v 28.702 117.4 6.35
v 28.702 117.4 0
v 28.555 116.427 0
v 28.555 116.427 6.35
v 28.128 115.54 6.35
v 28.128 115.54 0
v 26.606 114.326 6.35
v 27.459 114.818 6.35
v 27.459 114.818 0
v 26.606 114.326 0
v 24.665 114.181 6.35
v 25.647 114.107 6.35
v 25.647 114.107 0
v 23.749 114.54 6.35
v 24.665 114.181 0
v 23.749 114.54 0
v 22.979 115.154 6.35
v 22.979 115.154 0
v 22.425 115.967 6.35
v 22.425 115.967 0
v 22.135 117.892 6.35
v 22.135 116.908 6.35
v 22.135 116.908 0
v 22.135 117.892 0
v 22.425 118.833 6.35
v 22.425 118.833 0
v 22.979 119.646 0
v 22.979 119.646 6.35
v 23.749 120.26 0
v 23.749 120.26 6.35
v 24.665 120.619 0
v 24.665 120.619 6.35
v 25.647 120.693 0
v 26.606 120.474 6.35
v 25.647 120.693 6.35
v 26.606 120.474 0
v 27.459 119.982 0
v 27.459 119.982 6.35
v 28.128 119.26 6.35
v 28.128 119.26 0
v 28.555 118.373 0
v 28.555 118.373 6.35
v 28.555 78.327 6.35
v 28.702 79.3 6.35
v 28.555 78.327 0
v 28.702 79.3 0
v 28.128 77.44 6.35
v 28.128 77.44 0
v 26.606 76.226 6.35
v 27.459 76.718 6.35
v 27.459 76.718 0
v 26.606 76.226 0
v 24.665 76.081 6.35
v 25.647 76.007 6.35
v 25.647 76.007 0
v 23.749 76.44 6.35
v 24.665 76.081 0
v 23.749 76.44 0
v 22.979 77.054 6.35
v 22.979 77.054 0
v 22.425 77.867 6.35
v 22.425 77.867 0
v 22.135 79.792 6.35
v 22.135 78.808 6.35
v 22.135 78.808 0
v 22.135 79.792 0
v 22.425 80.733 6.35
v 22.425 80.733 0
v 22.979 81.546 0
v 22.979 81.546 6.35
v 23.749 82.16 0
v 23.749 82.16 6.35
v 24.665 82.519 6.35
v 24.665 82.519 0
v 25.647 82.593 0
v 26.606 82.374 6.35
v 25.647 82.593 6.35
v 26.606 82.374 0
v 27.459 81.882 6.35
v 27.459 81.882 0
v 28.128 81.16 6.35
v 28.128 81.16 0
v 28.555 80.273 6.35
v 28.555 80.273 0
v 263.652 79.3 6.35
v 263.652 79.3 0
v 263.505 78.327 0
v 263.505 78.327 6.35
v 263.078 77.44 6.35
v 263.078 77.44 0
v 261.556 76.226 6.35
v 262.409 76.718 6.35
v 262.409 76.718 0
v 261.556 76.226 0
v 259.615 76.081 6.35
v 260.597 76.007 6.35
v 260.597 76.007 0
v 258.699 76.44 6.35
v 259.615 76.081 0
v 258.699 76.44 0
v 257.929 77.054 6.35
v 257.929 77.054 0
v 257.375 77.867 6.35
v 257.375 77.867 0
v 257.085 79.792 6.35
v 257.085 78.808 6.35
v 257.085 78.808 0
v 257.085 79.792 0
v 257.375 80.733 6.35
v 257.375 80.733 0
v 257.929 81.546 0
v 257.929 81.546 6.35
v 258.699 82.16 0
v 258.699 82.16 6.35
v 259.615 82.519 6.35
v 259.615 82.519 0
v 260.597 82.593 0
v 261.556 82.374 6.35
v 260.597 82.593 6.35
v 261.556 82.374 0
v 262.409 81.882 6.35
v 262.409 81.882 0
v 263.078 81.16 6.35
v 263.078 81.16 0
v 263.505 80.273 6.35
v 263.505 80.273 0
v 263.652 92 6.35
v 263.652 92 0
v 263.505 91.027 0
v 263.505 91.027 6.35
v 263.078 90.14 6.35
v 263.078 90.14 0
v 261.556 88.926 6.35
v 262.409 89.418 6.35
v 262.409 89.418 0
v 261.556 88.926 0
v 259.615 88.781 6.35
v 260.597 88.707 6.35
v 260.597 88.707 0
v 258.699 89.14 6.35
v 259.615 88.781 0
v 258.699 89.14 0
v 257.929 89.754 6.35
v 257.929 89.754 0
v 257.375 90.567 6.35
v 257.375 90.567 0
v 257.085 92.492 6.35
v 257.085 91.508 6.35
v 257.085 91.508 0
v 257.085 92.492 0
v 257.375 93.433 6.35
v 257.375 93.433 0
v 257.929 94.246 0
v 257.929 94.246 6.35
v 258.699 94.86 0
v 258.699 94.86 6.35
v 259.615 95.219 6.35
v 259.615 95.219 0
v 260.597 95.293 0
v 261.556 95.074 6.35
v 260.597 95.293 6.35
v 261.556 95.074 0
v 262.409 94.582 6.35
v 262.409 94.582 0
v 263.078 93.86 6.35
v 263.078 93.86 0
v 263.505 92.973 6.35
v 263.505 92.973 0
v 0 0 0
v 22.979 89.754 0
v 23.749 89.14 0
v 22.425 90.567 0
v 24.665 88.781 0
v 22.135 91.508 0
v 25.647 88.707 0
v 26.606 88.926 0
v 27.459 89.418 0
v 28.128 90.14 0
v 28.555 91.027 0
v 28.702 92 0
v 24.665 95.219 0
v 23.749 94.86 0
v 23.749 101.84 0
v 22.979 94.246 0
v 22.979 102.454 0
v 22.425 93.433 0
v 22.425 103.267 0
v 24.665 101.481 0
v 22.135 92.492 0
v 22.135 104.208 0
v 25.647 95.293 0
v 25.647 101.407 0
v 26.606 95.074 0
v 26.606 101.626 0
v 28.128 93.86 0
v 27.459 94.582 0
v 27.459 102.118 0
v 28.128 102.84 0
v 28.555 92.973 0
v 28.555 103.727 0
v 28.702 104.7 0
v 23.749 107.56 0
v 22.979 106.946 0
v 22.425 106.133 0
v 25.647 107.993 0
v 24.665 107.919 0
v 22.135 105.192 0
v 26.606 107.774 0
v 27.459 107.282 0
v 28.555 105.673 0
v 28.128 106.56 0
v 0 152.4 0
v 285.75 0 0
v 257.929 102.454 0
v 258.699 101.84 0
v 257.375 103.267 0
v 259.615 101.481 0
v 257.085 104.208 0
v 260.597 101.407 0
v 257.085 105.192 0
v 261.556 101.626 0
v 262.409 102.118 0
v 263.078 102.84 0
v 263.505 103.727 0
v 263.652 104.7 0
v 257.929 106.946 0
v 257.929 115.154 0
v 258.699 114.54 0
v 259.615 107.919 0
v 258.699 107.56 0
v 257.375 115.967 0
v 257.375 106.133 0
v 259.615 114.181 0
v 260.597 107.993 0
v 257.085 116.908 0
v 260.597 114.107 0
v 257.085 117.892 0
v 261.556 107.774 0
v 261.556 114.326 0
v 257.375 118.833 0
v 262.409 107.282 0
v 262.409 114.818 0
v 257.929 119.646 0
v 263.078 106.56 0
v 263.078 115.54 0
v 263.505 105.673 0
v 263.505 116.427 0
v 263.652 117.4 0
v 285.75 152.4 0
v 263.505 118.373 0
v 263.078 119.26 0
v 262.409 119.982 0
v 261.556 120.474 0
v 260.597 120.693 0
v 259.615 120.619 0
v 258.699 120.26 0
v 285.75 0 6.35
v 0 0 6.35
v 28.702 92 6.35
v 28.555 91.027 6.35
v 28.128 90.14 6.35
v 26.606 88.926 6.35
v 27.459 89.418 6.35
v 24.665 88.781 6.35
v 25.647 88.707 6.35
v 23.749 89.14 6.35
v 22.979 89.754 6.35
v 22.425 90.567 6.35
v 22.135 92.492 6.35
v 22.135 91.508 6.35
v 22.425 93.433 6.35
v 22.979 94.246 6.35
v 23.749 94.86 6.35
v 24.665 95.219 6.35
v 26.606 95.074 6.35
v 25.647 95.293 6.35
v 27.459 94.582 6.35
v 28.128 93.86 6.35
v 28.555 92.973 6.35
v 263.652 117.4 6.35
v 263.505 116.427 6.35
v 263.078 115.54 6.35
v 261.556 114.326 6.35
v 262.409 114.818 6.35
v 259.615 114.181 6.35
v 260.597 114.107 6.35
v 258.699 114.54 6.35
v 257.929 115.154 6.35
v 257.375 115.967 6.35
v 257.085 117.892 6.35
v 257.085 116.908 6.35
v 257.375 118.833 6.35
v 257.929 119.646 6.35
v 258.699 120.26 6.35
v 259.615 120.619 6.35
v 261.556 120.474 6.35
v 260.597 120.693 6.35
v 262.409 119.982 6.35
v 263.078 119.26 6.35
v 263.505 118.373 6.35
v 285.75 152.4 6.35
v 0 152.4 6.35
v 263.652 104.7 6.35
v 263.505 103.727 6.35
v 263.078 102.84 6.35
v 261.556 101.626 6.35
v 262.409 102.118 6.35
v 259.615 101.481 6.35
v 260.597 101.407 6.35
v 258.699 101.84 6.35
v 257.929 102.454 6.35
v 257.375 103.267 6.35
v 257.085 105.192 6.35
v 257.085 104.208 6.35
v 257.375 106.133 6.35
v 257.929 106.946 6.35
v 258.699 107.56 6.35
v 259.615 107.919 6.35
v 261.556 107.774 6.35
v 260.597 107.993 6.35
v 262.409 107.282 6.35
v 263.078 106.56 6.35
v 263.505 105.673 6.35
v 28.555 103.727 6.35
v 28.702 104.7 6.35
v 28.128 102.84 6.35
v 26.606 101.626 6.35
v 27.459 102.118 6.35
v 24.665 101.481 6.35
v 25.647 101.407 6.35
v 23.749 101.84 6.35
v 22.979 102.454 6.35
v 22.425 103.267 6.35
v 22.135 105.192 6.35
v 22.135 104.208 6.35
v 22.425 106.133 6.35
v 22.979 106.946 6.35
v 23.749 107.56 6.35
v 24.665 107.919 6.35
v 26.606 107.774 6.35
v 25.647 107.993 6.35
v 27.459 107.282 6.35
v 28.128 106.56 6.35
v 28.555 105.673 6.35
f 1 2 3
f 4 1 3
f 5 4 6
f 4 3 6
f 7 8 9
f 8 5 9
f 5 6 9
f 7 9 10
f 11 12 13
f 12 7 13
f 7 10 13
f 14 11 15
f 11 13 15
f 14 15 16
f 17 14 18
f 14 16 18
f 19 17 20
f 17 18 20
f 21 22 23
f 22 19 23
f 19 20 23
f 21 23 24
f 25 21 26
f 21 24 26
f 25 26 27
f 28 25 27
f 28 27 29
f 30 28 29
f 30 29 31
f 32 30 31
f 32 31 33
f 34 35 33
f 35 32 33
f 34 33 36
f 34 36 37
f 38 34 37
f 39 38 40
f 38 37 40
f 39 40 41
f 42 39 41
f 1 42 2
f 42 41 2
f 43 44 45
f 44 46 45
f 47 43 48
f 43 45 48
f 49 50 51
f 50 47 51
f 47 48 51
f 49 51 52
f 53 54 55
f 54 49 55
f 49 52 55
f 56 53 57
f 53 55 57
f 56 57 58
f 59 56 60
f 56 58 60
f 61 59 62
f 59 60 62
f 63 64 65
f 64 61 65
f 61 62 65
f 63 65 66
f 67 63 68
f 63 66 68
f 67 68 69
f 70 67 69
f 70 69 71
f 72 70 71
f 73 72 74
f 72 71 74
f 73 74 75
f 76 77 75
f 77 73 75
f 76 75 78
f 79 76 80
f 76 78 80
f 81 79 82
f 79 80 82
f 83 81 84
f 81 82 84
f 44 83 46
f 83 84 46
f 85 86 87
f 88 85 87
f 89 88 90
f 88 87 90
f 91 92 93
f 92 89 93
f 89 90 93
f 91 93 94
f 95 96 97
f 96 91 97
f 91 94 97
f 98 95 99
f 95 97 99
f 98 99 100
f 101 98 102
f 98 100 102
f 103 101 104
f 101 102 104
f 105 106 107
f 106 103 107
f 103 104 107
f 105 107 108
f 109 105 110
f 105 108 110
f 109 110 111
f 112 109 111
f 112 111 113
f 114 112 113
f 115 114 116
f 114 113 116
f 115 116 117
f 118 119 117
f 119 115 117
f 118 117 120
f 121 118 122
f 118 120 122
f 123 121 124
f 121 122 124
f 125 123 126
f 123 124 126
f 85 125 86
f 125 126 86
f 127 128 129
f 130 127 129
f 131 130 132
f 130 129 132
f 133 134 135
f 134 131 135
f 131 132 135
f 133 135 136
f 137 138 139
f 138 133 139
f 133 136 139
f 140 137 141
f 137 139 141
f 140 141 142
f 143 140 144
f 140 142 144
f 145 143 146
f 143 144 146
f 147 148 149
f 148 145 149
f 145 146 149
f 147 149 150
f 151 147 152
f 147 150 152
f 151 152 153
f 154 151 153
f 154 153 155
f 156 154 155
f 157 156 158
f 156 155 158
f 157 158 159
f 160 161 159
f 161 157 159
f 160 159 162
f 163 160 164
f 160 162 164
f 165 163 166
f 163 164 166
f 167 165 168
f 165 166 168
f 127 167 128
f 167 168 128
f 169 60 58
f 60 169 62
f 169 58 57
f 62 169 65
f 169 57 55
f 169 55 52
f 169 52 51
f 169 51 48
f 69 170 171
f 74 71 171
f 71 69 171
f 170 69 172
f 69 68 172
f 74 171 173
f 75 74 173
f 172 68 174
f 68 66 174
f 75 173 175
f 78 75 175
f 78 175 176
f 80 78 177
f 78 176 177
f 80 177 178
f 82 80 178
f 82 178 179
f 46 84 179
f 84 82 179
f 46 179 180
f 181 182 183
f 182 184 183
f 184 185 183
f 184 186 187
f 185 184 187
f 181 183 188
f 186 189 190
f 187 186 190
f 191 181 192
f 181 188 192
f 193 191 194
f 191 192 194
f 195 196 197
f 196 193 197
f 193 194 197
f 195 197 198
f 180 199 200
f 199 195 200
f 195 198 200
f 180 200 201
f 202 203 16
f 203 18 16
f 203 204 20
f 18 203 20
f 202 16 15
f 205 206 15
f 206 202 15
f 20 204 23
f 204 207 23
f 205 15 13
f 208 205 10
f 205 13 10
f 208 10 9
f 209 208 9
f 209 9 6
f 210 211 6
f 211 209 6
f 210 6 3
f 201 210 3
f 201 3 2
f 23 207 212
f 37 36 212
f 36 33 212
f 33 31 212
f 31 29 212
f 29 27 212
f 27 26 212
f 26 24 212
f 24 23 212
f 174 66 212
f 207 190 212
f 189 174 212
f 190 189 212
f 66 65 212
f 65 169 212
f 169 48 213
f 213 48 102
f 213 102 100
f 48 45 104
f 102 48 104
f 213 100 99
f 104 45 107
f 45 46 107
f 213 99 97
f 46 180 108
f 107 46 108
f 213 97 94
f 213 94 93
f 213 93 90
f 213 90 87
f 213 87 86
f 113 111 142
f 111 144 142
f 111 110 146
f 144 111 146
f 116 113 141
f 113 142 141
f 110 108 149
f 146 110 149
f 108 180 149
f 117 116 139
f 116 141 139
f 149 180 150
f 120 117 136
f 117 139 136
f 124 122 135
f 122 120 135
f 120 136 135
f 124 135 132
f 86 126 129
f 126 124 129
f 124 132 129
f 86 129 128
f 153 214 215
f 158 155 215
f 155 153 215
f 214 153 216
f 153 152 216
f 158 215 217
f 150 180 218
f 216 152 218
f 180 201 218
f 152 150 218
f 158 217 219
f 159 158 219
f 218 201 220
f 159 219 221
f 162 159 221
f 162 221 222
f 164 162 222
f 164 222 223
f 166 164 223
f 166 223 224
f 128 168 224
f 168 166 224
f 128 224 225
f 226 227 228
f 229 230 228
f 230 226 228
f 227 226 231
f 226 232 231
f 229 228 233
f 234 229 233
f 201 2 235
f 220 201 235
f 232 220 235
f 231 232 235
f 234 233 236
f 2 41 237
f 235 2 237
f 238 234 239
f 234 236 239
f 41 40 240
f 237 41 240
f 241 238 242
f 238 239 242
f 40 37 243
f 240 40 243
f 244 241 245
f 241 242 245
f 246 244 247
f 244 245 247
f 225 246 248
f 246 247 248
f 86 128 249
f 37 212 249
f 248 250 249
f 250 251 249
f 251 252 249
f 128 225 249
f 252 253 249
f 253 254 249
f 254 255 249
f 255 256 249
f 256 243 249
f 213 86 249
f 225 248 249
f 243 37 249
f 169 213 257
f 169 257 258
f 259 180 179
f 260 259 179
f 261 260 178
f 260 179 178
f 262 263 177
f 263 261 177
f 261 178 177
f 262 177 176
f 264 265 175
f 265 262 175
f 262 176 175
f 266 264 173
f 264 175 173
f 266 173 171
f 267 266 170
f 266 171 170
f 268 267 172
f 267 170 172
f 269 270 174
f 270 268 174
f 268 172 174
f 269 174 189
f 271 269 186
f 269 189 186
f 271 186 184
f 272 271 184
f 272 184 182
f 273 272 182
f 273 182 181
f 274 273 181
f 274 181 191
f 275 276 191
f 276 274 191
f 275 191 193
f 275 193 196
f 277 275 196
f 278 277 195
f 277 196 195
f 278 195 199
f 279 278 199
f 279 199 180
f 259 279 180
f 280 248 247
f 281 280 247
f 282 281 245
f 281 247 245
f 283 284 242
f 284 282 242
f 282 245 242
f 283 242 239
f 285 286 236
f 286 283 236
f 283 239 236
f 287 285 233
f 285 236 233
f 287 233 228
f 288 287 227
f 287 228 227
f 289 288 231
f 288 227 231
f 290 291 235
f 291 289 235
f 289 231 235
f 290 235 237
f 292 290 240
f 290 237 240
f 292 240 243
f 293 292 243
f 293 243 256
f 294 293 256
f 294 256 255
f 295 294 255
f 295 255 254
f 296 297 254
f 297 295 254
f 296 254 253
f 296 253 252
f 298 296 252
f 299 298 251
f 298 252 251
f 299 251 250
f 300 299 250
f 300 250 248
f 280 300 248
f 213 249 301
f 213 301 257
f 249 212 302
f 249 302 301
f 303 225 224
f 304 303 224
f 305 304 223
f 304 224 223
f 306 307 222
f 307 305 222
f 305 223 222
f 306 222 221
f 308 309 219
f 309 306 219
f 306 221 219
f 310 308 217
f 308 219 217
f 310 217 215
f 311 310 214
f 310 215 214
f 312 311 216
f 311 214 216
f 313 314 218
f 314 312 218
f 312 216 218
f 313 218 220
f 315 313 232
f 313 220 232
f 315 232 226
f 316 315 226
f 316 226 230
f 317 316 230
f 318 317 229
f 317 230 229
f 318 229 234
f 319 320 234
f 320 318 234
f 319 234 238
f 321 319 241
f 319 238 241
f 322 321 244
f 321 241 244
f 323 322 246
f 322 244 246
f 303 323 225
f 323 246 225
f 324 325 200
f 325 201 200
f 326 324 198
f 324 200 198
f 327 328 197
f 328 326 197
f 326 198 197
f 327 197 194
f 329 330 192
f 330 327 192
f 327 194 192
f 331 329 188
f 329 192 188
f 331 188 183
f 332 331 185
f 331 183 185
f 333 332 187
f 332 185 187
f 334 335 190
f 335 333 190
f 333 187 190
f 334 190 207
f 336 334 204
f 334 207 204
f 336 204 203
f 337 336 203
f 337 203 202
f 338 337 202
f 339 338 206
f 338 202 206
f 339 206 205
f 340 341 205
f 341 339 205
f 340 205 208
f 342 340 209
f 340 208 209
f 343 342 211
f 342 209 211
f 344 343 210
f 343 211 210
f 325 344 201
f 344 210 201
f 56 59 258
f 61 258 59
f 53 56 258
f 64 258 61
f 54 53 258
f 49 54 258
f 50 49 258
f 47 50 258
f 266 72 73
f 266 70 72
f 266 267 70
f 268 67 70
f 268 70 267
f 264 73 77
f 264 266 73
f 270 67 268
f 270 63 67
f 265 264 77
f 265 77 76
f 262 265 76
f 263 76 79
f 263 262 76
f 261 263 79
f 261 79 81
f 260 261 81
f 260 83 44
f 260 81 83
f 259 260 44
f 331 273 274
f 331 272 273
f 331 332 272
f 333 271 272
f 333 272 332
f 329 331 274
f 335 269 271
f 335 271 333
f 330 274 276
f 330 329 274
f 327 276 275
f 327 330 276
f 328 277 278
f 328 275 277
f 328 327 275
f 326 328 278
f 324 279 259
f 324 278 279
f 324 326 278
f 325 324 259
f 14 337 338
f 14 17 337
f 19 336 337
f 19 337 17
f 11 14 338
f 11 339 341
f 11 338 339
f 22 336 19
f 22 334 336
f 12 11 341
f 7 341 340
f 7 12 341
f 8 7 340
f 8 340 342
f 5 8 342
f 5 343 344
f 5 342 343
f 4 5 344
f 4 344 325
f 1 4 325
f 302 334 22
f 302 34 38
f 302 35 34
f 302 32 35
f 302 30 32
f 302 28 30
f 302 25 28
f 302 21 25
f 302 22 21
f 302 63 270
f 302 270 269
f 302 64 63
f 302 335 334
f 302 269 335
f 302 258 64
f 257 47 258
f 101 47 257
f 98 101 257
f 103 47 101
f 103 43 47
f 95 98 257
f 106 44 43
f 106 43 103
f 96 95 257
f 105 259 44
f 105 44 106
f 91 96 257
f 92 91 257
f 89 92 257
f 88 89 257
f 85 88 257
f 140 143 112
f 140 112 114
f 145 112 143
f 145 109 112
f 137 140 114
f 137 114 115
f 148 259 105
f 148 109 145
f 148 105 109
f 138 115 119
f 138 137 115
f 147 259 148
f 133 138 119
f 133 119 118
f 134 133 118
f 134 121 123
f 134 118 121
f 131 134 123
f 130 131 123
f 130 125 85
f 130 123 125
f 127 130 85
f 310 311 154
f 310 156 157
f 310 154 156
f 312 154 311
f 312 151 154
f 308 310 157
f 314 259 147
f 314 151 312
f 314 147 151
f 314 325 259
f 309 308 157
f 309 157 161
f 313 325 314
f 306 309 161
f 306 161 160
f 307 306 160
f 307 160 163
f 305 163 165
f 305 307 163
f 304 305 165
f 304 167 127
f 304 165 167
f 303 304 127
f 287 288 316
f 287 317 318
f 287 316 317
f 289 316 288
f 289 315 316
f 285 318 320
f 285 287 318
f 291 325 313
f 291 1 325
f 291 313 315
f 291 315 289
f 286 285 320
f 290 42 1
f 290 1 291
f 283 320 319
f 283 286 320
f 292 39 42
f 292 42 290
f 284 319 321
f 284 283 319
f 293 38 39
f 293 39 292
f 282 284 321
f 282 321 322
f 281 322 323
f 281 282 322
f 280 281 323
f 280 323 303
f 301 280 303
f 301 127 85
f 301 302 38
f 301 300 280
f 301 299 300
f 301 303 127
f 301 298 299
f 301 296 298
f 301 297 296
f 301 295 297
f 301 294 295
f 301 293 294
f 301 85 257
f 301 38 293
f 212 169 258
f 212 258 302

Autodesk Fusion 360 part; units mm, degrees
sketch "long_side" plane through (0, 0, 0) normal (0, 0, 1) x (1, 0, 0)
  line L0 (0, 152.4) -> (285.75, 152.4)
  line L1 (285.75, 152.4) -> (285.75, 0)
  line L2 (285.75, 0) -> (0, 0)
  line L3 (0, 0) -> (0, 152.4)
  circle A0 centre (25.4, 117.4) radius 3.302
  circle A1 centre (25.4, 92) radius 3.302
  circle A2 centre (25.4, 79.3) radius 3.302
  circle A3 centre (25.4, 104.7) radius 3.302
  circle A4 centre (260.35, 117.4) radius 3.302
  circle A5 centre (260.35, 92) radius 3.302
  circle A6 centre (260.35, 104.7) radius 3.302
  circle A7 centre (260.35, 79.3) radius 3.302
  dimension "d1" = 285.75
  dimension "d2" = 152.4
  dimension "d3" = 6.604
  dimension "d55" = 6.604
  dimension "d57" = 6.604
  dimension "d63" = 6.604
  dimension "d75" = 35
  dimension "d76" = 25.4
  dimension "d77" = 12.7
  dimension "d78" = 25.4
  dimension "d79" = 25.4
  dimension "d80" = 25.4
  dimension "d81" = 12.7
  dimension "d82" = 12.7
  dimension "d89" = 6.604
  dimension "d90" = 6.604
  dimension "d91" = 6.604
  dimension "d92" = 6.604
  dimension "d93" = 12.7
  dimension "d94" = 12.7
  dimension "d95" = 12.7
  dimension "d96" = 25.4
  dimension "d97" = 25.4
  dimension "d98" = 25.4
  dimension "d99" = 25.4
  dimension "d100" = 35
extrude "Extrude1" add sketch "long_side" along normal blind 6.35
sketch "Sketch2" plane through (0, 0, 0) normal (0, 0, 1) x (1, 0, 0)
  line L0 (25, 117) -> (25, 104.3) construction
  dimension "d35" = 12.7
